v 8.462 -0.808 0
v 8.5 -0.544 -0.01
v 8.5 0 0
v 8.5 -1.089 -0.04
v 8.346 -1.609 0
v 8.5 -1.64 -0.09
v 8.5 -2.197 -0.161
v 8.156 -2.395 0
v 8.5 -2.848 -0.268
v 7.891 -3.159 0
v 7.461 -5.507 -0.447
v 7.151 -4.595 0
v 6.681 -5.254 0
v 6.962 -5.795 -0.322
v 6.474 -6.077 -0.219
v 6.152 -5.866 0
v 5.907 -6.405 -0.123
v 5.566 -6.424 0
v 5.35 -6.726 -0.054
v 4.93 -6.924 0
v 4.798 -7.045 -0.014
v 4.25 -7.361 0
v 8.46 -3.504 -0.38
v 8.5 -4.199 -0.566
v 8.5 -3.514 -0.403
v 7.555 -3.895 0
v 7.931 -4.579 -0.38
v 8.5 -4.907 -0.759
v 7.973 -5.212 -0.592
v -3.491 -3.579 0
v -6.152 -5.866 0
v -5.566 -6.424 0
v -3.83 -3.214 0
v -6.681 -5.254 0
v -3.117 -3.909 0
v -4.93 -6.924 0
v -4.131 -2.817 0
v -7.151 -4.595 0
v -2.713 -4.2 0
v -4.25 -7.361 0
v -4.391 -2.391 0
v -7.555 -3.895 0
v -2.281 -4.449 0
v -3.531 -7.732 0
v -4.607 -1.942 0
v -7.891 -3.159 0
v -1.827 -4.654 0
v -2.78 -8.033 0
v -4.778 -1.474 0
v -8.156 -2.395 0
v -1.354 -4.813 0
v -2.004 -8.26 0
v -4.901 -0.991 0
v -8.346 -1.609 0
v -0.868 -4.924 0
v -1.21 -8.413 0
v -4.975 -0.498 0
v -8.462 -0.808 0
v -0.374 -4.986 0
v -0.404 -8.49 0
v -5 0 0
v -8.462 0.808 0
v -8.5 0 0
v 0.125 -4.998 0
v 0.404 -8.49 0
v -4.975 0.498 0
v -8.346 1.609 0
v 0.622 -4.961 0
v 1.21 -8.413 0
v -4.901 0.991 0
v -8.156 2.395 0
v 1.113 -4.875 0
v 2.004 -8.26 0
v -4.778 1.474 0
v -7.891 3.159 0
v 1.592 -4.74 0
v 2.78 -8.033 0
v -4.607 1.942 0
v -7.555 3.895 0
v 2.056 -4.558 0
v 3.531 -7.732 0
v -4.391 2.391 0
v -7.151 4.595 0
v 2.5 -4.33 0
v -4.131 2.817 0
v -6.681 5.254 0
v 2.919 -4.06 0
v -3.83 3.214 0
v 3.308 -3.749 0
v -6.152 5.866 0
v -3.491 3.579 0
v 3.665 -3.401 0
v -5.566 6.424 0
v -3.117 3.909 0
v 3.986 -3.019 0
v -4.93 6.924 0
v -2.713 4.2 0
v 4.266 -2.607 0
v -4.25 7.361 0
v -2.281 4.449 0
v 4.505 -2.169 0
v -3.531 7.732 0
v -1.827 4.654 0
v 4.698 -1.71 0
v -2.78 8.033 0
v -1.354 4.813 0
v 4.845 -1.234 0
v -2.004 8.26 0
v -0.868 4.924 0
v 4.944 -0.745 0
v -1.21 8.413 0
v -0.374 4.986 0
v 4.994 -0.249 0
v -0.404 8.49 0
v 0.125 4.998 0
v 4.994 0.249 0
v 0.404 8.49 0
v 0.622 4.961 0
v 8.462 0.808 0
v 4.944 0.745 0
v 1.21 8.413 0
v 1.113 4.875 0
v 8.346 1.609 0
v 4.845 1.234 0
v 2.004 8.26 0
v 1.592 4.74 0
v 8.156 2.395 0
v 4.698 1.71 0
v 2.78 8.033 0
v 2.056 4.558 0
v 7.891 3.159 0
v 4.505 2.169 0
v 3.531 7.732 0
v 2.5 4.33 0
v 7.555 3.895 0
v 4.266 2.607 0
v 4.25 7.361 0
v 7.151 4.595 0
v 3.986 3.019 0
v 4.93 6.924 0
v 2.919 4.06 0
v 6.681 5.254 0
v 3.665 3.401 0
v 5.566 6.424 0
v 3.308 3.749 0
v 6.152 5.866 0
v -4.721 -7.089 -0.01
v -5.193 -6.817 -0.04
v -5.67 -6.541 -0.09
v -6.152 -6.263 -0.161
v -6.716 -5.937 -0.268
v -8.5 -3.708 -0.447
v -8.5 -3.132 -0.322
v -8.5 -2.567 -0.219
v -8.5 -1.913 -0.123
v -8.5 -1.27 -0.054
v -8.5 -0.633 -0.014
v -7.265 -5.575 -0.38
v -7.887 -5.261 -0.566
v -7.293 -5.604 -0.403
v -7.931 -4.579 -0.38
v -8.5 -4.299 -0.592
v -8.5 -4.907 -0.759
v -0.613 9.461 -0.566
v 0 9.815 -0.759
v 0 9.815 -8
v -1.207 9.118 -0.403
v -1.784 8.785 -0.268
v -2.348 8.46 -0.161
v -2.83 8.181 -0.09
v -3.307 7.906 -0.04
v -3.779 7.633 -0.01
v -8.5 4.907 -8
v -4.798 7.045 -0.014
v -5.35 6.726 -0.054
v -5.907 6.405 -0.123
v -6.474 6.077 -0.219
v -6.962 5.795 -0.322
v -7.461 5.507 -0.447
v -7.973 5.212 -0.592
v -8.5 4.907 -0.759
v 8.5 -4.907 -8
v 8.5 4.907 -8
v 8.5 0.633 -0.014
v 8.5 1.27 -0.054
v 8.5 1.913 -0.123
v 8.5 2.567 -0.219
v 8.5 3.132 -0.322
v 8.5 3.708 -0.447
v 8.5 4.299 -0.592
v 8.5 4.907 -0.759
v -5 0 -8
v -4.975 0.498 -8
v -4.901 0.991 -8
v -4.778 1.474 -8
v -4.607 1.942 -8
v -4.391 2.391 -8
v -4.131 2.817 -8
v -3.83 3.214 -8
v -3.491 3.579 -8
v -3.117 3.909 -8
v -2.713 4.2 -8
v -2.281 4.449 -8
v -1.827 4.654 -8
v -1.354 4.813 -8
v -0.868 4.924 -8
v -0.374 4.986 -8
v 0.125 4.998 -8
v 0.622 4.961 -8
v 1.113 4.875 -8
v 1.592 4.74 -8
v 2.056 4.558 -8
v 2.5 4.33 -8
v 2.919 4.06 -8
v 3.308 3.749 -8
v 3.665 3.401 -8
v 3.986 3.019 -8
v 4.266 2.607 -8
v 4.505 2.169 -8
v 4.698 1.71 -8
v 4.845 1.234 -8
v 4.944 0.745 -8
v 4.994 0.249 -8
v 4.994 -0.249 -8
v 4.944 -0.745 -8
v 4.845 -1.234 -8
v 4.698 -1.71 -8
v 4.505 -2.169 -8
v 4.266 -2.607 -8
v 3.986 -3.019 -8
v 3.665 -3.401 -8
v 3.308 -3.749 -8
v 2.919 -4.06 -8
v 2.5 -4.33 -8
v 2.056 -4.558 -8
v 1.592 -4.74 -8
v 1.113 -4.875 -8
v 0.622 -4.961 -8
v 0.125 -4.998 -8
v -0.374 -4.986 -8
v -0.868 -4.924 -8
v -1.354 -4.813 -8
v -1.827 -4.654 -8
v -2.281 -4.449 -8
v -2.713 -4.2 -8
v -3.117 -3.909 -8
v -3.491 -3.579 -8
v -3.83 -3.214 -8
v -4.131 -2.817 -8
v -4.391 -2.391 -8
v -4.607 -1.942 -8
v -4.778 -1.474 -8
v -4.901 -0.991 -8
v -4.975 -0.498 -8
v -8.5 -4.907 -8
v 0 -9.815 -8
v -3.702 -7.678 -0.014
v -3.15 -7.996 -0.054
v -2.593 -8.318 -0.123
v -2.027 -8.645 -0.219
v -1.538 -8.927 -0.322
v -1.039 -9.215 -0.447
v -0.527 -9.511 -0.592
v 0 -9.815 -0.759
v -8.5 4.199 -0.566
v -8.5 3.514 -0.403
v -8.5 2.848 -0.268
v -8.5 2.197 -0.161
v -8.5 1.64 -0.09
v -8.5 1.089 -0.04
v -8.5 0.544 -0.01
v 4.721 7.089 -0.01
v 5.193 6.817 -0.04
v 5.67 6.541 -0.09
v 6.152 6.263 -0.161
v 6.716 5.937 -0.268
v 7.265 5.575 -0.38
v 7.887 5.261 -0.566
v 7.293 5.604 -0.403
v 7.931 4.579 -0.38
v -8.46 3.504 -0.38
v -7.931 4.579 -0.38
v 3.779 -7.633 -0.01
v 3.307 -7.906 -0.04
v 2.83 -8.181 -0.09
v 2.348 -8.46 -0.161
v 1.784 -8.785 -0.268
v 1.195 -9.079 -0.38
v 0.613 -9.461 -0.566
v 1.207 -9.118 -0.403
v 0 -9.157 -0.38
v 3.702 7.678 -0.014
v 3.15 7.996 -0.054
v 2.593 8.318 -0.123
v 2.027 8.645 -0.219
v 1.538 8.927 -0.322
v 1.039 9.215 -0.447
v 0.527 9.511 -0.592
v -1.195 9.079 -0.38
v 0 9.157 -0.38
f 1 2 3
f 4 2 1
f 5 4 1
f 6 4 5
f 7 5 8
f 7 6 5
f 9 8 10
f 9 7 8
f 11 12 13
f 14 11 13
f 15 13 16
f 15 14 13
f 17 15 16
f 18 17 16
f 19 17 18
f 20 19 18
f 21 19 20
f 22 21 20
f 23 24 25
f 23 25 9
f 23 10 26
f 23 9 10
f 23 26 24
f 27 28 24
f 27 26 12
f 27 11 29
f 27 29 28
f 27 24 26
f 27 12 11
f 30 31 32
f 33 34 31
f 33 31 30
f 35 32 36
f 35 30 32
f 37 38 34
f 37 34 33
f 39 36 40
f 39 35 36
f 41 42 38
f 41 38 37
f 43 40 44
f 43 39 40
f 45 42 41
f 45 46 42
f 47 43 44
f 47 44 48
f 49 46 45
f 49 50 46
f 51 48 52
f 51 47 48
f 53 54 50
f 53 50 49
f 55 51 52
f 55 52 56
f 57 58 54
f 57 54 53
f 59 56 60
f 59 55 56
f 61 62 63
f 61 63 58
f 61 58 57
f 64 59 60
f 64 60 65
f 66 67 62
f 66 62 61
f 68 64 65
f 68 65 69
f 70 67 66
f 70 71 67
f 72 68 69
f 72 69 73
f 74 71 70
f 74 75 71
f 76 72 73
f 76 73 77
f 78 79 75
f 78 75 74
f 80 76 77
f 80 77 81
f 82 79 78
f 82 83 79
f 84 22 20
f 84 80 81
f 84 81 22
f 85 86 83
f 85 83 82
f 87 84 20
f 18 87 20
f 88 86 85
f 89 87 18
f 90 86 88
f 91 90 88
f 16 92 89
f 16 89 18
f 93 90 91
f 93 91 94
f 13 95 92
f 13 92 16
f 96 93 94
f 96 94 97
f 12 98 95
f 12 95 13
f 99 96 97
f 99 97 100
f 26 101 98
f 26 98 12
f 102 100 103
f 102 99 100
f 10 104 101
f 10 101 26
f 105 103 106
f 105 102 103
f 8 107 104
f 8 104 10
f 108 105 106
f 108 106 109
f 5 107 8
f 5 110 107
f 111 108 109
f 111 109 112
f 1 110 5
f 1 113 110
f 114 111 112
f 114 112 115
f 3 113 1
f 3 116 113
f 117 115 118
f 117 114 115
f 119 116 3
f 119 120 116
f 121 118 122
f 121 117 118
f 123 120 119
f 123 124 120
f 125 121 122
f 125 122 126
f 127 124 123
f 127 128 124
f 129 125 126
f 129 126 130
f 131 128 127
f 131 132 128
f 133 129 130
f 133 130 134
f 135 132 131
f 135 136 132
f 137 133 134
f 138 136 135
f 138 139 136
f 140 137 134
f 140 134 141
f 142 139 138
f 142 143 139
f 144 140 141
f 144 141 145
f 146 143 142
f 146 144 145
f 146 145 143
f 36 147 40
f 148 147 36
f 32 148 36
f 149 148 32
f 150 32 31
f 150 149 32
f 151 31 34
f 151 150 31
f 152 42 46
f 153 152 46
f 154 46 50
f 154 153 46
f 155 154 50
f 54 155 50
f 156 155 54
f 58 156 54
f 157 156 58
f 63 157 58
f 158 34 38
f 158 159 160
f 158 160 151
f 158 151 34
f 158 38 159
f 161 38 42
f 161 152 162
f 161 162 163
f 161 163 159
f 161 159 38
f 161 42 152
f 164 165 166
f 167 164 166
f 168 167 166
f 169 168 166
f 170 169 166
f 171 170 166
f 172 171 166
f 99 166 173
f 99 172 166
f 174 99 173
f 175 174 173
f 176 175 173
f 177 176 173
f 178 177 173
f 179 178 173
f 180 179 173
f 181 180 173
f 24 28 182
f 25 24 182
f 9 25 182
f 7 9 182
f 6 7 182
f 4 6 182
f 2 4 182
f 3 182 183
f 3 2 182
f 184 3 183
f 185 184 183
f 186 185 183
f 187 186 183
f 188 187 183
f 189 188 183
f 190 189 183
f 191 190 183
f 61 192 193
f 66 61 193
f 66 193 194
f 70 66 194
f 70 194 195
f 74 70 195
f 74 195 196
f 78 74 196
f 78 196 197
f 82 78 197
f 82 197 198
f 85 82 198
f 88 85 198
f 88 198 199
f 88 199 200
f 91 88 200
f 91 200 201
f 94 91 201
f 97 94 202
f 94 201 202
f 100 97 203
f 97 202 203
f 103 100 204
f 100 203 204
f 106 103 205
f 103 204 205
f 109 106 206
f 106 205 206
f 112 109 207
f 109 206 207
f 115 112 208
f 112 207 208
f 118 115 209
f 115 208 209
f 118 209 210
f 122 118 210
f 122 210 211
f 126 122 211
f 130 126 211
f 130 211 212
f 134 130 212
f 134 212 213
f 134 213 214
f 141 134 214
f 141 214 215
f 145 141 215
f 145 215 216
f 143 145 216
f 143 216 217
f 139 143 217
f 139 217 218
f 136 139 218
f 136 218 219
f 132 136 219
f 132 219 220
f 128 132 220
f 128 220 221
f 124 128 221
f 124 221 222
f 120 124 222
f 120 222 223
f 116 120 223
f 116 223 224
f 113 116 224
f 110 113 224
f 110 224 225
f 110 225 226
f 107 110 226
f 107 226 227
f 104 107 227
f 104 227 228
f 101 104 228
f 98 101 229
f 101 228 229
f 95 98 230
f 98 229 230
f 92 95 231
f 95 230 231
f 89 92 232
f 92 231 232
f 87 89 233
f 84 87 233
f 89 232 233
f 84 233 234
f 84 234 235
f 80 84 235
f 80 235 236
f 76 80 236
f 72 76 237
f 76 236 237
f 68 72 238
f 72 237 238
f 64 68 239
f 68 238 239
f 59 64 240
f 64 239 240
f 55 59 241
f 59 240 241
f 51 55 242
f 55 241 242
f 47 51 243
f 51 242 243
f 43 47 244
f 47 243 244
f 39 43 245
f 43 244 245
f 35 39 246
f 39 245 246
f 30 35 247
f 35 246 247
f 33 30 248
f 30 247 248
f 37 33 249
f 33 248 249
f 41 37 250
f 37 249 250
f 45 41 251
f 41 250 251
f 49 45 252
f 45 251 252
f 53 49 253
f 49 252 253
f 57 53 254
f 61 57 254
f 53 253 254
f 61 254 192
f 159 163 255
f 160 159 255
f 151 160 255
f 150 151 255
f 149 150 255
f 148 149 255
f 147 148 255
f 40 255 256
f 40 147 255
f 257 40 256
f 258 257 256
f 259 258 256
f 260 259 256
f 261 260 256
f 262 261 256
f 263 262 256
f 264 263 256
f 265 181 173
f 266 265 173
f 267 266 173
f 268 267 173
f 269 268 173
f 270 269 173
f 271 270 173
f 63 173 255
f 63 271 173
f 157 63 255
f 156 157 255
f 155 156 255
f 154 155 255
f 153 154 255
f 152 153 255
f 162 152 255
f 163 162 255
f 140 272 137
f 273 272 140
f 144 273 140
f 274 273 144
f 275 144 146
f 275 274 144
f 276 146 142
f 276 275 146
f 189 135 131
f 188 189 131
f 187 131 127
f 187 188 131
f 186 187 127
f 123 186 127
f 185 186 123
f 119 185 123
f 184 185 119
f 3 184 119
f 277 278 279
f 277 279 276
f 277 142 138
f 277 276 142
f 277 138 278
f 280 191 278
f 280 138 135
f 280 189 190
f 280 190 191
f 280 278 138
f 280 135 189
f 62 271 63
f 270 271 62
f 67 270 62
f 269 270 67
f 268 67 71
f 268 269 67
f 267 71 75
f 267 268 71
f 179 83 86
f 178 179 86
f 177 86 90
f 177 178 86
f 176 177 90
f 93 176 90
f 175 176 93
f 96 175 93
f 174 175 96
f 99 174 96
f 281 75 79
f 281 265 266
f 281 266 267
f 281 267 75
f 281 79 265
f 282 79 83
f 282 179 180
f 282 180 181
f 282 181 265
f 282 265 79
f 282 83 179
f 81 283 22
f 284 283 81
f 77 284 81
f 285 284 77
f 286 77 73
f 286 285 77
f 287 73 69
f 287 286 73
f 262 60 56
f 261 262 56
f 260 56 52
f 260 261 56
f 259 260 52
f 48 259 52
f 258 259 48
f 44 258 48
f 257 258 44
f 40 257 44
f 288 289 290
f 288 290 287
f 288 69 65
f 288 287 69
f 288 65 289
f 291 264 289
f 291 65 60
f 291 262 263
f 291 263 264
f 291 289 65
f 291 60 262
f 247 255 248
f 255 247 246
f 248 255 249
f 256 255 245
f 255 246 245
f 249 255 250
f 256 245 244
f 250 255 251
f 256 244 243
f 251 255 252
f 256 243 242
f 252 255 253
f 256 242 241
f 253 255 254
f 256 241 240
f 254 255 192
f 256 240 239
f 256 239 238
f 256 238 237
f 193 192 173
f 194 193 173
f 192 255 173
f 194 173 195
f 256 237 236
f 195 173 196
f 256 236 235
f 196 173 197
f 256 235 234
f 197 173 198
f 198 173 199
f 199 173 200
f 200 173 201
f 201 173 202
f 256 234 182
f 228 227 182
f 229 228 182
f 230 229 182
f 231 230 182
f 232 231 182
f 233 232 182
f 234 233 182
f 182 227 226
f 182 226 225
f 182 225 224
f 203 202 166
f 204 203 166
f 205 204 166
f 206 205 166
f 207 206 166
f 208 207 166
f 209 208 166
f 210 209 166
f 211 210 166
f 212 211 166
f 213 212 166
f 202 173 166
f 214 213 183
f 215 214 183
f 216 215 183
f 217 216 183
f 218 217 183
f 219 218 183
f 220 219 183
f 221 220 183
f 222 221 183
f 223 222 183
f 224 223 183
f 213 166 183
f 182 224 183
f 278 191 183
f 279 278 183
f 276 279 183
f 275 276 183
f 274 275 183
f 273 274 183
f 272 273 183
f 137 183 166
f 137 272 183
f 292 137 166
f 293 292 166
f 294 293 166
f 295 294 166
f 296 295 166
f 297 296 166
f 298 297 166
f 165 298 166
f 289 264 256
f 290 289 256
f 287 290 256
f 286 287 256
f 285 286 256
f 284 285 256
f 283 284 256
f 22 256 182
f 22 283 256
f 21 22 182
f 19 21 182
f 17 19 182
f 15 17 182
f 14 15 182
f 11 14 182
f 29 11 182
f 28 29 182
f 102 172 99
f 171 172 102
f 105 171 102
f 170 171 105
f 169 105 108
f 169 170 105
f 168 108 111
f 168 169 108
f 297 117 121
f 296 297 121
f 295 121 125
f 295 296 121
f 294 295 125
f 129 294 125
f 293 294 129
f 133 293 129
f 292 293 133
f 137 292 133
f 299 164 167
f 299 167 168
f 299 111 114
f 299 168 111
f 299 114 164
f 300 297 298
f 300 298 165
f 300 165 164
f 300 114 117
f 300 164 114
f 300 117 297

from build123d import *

# Parameters (mm, degrees)
F1_DEPTH = 8
F4_D     = 10


with BuildPart() as f1:
    # F0 (on Top) → F1 (new body)
    with BuildSketch(Plane.XY):
        Polygon((8.5, -4.907477), (8.5, 4.907477), (0, 9.814955), (-8.5, 4.907477), (-8.5, -4.907477), (0, -9.814955), align=None)
    extrude(amount=-F1_DEPTH)

    # F2 (on Right) → F3 (revolve, cut)
    with BuildSketch(Plane.YZ):
        Polygon((13.814955, 0), (8.5, 0), (13.814955, -3.06859), align=None)
    revolve(axis=Axis((0, 0, -3.475147), (0, 0, -1)), mode=Mode.SUBTRACT)

    # F4 (through all)
    with Locations(Plane.XY):
        with Locations((0, 0)):
            Hole(F4_D / 2)


solid = f1.part
